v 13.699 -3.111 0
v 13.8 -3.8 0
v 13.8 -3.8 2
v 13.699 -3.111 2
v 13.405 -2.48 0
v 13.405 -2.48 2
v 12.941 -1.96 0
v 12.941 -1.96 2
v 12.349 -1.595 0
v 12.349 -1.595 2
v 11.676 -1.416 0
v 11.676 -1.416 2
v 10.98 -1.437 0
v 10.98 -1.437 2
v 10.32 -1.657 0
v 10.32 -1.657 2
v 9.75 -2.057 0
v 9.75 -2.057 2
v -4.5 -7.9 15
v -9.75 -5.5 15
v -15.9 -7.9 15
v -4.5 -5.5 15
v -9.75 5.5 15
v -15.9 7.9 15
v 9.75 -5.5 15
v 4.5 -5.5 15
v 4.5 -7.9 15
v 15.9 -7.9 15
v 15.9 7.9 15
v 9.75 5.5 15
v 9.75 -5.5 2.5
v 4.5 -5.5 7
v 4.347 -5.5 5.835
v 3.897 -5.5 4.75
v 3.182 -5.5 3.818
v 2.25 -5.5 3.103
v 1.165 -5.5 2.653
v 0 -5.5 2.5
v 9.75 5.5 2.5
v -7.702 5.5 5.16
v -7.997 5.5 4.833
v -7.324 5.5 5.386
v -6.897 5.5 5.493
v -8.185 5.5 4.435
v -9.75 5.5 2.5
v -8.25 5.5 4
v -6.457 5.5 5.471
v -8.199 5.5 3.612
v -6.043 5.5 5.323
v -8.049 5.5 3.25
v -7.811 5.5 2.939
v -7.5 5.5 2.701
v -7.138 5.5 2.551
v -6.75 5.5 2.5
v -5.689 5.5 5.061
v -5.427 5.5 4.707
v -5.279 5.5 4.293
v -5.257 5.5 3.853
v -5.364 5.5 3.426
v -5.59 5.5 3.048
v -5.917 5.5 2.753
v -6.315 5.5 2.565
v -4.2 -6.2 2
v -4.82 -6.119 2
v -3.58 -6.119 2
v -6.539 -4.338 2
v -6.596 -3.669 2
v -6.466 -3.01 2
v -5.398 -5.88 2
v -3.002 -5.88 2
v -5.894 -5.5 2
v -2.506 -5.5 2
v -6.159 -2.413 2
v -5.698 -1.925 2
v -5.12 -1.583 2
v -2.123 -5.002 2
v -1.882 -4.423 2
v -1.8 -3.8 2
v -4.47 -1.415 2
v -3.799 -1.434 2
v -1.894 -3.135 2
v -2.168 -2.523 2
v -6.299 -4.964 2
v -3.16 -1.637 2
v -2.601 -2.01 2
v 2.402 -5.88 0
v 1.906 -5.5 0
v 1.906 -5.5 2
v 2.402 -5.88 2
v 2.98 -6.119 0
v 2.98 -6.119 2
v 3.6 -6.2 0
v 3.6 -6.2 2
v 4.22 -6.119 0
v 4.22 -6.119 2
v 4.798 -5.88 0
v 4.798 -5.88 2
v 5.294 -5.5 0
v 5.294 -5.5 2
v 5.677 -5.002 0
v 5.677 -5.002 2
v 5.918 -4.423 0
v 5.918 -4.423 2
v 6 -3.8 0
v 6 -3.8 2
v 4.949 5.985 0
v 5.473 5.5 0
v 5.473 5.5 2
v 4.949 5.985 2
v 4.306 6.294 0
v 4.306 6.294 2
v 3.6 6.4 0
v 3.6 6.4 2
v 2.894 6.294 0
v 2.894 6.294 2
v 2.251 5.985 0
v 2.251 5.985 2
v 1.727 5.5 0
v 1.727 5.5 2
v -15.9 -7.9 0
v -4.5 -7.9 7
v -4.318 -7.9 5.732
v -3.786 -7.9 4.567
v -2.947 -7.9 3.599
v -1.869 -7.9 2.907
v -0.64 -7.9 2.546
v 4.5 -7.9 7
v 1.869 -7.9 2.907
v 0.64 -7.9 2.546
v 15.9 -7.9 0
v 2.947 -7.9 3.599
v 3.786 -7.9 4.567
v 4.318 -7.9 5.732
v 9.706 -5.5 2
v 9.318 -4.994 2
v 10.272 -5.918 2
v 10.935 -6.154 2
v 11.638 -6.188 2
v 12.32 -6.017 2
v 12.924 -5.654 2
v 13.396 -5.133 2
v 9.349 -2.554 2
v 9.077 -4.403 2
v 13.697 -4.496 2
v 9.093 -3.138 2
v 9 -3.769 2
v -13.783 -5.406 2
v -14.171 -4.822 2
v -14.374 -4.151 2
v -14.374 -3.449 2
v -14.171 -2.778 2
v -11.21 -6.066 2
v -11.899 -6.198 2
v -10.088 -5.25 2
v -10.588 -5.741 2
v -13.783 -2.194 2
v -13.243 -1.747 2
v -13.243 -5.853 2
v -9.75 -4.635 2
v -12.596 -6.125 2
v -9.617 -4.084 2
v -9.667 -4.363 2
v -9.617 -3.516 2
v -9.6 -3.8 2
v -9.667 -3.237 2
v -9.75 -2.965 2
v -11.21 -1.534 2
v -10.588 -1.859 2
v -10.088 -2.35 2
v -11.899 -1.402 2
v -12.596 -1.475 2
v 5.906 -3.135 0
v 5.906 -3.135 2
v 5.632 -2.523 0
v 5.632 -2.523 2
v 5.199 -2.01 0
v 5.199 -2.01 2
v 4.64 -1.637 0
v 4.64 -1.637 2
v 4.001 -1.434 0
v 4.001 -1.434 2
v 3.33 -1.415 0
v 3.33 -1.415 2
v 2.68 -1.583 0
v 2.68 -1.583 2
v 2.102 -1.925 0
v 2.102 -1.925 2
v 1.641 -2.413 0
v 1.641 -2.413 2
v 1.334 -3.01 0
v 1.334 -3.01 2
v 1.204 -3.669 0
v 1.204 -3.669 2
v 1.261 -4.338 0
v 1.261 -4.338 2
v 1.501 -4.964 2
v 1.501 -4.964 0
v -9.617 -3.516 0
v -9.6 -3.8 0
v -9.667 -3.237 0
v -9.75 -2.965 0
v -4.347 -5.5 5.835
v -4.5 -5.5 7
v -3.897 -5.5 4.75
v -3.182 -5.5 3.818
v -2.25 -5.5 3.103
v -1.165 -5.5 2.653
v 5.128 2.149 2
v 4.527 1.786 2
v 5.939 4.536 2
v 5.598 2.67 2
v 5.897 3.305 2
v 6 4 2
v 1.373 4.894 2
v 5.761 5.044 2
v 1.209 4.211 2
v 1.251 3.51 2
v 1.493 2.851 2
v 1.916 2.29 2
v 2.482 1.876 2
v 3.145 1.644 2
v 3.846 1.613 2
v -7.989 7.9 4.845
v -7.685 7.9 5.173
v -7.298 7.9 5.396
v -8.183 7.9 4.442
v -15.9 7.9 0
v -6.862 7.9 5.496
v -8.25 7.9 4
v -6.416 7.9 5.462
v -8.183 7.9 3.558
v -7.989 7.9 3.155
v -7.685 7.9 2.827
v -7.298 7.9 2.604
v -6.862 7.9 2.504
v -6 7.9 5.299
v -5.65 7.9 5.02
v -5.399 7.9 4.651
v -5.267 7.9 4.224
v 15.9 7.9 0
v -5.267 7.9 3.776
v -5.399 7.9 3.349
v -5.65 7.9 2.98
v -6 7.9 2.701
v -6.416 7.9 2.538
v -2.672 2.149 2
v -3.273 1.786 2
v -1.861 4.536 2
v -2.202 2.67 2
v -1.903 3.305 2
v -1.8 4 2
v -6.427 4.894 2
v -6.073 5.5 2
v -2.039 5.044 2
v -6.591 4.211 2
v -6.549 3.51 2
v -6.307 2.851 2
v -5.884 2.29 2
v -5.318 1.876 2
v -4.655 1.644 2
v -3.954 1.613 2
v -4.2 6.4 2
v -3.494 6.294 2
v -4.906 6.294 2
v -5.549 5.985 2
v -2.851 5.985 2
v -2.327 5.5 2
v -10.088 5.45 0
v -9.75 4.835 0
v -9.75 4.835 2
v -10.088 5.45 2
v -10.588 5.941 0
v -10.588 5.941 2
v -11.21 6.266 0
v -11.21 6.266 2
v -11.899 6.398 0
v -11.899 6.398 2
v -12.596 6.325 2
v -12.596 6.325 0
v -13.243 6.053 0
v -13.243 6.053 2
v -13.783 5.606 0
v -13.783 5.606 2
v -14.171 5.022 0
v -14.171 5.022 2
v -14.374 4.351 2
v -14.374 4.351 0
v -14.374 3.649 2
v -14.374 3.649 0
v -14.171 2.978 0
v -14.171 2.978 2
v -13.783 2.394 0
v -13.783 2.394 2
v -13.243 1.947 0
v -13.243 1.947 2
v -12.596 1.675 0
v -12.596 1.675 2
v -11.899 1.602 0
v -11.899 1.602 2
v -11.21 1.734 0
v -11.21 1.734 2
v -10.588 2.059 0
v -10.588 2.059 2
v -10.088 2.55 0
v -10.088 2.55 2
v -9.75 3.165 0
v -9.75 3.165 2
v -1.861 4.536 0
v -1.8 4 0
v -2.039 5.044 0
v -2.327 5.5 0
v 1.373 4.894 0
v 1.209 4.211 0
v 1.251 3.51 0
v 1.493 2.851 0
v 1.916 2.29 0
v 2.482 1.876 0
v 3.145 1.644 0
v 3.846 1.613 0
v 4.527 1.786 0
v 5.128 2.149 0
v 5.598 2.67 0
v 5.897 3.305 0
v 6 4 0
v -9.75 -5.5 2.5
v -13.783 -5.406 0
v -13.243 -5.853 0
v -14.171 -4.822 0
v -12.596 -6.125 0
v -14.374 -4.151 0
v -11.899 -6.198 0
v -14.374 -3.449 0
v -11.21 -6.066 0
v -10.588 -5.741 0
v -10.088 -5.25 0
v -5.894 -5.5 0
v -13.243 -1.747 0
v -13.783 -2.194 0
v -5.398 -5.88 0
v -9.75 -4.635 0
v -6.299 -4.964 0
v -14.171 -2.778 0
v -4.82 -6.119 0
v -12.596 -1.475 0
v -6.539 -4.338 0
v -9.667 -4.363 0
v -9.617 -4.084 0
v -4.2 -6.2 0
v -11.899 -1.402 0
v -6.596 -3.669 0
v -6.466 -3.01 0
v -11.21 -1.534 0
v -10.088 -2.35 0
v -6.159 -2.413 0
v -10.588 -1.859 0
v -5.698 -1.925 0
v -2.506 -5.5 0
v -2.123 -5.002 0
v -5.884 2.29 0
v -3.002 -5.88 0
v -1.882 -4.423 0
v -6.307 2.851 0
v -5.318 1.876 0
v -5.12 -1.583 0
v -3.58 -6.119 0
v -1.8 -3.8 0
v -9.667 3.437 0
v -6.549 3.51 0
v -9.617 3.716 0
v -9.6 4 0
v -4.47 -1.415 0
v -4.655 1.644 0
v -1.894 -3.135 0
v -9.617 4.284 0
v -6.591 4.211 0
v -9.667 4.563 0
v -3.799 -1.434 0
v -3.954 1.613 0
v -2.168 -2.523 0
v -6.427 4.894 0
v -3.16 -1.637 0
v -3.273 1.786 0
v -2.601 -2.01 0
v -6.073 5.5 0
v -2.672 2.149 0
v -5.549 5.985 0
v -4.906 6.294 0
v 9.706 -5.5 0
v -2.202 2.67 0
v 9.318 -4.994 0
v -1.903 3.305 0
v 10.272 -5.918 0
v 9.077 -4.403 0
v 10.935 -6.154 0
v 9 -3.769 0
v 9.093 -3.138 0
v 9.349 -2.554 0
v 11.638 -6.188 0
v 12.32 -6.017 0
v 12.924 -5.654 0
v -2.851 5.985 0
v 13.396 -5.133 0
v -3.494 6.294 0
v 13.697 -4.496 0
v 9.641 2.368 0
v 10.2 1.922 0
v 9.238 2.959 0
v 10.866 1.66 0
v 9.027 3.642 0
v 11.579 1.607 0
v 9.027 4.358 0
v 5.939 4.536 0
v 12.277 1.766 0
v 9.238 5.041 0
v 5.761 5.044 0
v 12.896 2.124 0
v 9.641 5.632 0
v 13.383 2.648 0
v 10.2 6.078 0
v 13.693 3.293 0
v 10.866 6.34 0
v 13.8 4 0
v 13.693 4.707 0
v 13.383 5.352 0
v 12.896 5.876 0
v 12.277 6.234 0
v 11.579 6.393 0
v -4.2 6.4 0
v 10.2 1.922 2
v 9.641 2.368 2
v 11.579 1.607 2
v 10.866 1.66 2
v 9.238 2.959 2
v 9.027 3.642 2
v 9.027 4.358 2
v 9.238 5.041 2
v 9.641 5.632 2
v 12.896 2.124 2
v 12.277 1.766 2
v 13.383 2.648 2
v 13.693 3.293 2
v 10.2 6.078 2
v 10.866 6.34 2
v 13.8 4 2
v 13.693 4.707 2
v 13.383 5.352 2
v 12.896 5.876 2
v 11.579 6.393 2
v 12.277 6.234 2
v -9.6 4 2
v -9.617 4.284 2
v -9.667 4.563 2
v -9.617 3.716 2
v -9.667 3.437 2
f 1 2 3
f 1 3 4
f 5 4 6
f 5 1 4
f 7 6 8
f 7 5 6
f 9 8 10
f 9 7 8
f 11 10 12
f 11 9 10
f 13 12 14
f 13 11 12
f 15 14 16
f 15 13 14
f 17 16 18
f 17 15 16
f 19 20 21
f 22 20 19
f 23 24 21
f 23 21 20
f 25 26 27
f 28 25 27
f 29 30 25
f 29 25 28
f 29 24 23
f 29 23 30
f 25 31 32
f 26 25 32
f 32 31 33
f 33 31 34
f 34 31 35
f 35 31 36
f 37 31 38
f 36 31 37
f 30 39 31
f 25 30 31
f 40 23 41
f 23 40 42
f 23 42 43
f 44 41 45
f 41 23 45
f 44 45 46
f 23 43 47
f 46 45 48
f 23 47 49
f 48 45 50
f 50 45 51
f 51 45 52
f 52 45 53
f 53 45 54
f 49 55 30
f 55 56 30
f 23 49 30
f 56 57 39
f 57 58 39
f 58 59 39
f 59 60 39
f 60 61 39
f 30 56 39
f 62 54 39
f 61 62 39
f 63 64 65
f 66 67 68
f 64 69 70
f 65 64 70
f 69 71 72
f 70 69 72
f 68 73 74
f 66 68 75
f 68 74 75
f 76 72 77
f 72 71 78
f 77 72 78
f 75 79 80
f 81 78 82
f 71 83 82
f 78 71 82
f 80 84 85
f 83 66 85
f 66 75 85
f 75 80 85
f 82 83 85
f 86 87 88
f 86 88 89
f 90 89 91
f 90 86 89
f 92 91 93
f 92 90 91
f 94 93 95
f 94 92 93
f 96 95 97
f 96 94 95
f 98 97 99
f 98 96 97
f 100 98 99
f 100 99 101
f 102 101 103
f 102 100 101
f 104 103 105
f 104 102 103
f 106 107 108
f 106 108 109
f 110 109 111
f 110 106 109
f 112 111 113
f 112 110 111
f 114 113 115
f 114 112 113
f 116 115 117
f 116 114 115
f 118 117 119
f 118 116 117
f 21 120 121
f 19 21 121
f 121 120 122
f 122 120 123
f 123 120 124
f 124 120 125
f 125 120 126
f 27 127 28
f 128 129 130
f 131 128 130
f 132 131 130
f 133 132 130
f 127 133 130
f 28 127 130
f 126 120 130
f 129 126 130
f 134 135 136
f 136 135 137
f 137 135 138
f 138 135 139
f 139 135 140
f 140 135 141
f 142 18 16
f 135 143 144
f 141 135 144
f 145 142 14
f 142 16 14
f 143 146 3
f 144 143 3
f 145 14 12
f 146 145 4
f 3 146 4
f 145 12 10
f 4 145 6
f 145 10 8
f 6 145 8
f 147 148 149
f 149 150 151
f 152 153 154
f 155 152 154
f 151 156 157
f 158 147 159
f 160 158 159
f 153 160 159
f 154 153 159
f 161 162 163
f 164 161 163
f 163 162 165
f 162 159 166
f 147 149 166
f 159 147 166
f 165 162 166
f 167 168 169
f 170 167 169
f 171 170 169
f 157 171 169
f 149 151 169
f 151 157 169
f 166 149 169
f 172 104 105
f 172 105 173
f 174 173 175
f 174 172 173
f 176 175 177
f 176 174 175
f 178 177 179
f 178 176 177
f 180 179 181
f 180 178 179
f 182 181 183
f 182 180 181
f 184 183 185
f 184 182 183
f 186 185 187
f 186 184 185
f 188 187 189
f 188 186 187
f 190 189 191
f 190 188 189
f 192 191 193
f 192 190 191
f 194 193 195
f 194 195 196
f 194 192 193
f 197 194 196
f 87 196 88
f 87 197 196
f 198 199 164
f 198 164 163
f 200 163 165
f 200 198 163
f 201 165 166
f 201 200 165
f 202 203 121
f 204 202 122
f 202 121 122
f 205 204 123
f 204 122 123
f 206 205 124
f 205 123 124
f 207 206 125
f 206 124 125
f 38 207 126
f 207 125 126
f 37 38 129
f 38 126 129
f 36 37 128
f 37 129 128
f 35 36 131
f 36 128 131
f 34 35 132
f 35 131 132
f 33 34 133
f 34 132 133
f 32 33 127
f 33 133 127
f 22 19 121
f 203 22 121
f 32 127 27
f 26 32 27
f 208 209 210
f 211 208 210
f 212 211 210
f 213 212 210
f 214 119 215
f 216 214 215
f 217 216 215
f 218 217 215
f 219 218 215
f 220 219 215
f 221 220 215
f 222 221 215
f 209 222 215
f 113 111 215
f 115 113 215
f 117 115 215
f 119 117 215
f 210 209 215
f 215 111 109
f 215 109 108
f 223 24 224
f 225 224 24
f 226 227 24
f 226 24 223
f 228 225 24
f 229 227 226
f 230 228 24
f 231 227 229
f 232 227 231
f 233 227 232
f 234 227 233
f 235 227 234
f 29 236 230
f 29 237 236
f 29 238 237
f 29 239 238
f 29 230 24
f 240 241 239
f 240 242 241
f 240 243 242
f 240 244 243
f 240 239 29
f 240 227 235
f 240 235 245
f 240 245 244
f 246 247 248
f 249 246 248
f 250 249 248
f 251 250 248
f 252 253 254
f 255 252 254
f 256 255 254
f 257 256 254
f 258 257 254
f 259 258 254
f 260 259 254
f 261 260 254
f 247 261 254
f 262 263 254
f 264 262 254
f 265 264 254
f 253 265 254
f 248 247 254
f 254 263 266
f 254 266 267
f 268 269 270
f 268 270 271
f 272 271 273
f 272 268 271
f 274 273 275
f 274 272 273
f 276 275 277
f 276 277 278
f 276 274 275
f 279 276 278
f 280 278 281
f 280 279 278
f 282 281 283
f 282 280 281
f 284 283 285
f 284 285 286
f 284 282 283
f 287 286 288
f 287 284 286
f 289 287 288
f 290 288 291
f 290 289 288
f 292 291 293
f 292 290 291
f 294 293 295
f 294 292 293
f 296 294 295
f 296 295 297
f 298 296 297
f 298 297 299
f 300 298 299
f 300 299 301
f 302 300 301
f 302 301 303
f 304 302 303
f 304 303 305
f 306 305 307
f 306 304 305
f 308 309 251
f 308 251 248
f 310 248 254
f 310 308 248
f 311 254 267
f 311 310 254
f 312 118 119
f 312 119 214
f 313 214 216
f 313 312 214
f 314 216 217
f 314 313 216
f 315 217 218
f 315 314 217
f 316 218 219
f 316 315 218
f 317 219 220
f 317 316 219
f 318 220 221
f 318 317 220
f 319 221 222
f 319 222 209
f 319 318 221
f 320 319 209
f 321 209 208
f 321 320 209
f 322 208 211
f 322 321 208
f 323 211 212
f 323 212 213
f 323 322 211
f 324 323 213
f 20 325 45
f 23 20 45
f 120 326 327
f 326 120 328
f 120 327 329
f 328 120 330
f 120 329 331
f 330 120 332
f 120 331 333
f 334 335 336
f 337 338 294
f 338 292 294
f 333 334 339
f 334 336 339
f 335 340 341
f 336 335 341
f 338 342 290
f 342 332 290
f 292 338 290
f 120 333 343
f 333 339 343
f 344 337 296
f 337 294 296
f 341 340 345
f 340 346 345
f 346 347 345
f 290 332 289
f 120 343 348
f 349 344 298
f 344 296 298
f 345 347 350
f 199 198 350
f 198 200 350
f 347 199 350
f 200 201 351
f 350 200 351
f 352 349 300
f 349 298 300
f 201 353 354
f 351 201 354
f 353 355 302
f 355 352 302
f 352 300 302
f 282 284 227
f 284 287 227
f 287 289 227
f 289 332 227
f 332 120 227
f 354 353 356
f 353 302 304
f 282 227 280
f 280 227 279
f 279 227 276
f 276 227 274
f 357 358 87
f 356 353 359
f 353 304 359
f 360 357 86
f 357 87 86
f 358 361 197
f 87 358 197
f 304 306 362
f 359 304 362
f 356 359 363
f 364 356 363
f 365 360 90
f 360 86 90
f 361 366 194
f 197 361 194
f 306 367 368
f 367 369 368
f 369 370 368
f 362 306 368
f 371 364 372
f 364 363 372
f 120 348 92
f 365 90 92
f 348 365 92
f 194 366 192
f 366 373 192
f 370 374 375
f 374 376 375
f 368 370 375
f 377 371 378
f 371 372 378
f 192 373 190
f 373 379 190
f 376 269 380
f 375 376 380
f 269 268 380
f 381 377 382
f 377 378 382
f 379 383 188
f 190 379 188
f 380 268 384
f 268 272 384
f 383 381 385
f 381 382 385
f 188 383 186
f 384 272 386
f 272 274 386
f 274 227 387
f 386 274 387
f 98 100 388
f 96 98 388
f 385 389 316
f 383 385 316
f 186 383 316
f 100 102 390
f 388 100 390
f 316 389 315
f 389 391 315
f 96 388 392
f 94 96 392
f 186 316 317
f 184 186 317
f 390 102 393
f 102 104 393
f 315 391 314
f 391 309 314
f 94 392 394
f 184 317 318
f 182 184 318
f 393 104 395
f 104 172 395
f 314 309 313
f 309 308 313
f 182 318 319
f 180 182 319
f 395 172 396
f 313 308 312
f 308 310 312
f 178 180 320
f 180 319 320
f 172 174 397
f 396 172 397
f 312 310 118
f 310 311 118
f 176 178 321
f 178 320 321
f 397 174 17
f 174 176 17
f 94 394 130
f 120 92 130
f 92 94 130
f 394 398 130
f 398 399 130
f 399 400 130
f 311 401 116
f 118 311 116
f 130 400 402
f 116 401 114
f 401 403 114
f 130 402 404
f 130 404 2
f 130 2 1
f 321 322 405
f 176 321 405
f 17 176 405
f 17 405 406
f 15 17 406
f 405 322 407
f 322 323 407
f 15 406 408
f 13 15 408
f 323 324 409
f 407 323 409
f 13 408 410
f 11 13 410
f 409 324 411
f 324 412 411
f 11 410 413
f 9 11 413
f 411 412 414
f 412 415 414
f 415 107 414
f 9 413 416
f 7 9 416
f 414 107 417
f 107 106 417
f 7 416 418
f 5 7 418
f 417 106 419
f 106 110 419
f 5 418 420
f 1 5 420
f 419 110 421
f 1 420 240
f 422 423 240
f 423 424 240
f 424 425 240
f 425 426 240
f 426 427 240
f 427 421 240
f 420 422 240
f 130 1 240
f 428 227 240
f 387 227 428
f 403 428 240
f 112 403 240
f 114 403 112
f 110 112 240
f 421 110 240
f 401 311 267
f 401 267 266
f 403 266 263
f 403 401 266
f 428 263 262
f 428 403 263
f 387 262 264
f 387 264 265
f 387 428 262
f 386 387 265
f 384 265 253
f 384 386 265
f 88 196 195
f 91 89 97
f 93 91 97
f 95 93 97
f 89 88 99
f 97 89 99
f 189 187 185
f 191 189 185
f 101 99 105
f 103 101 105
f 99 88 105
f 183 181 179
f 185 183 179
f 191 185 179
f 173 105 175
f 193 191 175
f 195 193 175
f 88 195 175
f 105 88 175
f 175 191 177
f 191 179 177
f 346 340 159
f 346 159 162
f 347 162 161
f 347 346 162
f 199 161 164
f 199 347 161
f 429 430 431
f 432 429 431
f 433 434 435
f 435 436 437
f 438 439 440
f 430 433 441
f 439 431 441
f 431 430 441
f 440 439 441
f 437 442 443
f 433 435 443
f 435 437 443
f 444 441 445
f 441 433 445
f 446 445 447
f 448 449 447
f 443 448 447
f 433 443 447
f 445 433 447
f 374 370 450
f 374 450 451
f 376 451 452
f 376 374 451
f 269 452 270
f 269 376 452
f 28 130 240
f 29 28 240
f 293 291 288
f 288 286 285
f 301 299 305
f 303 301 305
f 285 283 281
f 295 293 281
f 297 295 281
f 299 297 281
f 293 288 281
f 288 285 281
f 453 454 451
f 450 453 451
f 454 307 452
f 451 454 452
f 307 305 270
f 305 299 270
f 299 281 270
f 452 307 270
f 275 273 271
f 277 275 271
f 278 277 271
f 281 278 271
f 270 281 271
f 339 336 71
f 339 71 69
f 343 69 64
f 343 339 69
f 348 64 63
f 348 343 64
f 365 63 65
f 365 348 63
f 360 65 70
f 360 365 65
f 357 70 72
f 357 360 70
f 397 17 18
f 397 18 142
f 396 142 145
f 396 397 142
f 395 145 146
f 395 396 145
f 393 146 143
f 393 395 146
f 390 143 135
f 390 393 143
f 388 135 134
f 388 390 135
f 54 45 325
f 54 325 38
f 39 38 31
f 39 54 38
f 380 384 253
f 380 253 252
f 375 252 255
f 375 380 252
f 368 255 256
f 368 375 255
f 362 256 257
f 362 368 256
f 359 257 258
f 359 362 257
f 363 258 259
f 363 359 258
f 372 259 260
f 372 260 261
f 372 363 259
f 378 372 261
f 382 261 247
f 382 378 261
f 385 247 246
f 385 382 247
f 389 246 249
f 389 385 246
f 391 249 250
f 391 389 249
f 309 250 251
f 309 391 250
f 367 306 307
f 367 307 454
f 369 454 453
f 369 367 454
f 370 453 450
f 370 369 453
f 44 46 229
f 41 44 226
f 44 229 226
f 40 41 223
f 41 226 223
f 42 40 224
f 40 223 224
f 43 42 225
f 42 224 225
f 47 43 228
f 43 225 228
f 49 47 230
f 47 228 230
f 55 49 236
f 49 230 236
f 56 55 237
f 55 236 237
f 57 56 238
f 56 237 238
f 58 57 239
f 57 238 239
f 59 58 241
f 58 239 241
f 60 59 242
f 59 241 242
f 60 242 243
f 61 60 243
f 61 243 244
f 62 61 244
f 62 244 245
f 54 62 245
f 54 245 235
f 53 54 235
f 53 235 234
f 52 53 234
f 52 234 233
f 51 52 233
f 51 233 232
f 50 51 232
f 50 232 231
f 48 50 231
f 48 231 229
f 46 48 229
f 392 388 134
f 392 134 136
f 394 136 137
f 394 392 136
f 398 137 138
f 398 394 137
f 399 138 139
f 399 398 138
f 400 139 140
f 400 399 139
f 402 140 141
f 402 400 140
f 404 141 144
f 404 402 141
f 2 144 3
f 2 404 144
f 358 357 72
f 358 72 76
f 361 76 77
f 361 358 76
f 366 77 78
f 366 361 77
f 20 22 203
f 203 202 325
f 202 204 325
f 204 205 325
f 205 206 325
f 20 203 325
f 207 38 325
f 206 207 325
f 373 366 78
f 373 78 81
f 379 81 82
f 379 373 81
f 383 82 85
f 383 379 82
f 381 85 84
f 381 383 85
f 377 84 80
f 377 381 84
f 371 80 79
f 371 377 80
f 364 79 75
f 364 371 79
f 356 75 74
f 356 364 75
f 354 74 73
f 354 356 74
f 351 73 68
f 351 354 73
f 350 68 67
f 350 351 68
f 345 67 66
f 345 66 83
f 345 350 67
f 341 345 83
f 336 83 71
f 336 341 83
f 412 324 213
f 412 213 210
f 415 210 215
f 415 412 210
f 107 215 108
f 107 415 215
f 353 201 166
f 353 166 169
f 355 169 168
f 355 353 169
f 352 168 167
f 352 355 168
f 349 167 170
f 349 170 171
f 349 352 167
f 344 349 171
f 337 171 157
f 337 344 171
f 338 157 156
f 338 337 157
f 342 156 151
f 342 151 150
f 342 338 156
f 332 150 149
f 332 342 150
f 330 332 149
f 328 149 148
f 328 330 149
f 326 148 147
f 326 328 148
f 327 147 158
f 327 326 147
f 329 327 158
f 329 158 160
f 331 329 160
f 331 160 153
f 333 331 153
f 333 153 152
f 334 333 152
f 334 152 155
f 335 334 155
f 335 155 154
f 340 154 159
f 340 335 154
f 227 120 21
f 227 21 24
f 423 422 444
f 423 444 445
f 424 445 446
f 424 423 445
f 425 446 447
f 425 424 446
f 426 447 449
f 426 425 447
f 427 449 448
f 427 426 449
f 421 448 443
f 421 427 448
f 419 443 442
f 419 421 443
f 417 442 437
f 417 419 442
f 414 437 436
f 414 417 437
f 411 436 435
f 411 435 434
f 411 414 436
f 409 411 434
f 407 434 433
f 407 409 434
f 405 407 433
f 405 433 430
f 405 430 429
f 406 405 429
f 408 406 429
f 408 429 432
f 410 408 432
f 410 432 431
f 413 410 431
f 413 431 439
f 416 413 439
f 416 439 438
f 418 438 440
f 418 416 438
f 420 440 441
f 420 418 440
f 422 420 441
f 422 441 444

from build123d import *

# Parameters (mm, degrees)
F0_W     = 31.8
F0_H     = 15.8
F1_DEPTH = 15
F3_DEPTH = 2.4
F4_DEPTH = 2.5
F5_R     = 1.5
F6_DEPTH = 2.4
F7_DEPTH = 2


with BuildPart() as f1:
    # F0 (on Top) → F1 (new body)
    with BuildSketch(Plane.XY):
        Rectangle(F0_W, F0_H)
        with BuildLine():
            Line((-9.75, 4.8351646544), (-9.75, 5.5))
            Line((-9.75, 5.5), (-6.0734993995, 5.5))
            ThreePointArc((-6.0734993995, 5.5), (-4.2, 6.4), (-2.3265006005, 5.5))
            Line((-2.3265006005, 5.5), (1.7265006005, 5.5))
            ThreePointArc((1.7265006005, 5.5), (3.6, 6.4), (5.4734993995, 5.5))
            Line((5.4734993995, 5.5), (9.5265006005, 5.5))
            ThreePointArc((9.5265006005, 5.5), (12.1948589312, 6.2645527769), (13.8, 4))
            ThreePointArc((13.8, 4), (12.3486832981, 1.7954592315), (9.75, 2.2571574942))
            Line((9.75, 2.2571574942), (9.75, -2.0571574942))
            ThreePointArc((9.75, -2.0571574942), (12.3486832981, -1.5954592315), (13.8, -3.8))
            ThreePointArc((13.8, -3.8), (12.3203646443, -6.016512784), (9.7058925654, -5.5))
            Line((9.7058925654, -5.5), (5.2941074346, -5.5))
            ThreePointArc((5.2941074346, -5.5), (3.6, -6.2), (1.9058925654, -5.5))
            Line((1.9058925654, -5.5), (-2.5058925654, -5.5))
            ThreePointArc((-2.5058925654, -5.5), (-4.2, -6.2), (-5.8941074346, -5.5))
            Line((-5.8941074346, -5.5), (-9.75, -5.5))
            Line((-9.75, -5.5), (-9.75, -4.6351646544))
            ThreePointArc((-9.75, -4.6351646544), (-14.4, -3.8), (-9.75, -2.9648353456))
            Line((-9.75, -2.9648353456), (-9.75, 3.1648353456))
            ThreePointArc((-9.75, 3.1648353456), (-14.4, 4), (-9.75, 4.8351646544))
        make_face(mode=Mode.SUBTRACT)
        with BuildLine():
            Line((-9.75, -4.6351646544), (-9.75, -2.9648353456))
            ThreePointArc((-9.75, -2.9648353456), (-14.4, -3.8), (-9.75, -4.6351646544))
        make_face()
        with BuildLine():
            Line((-9.75, 3.1648353456), (-9.75, 4.8351646544))
            ThreePointArc((-9.75, 4.8351646544), (-14.4, 4), (-9.75, 3.1648353456))
        make_face()
        with BuildLine():
            ThreePointArc((13.8, 4), (12.1948589312, 6.2645527769), (9.5265006005, 5.5))
            Line((9.5265006005, 5.5), (9.75, 5.5))
            Line((9.75, 5.5), (9.75, 2.2571574942))
            ThreePointArc((9.75, 2.2571574942), (12.3486832981, 1.7954592315), (13.8, 4))
        make_face()
        with BuildLine():
            ThreePointArc((13.8, -3.8), (12.3486832981, -1.5954592315), (9.75, -2.0571574942))
            Line((9.75, -2.0571574942), (9.75, -5.5))
            Line((9.75, -5.5), (9.7058925654, -5.5))
            ThreePointArc((9.7058925654, -5.5), (12.3203646443, -6.016512784), (13.8, -3.8))
        make_face()
        with BuildLine():
            ThreePointArc((-2.3265006005, 5.5), (-4.2, 6.4), (-6.0734993995, 5.5))
            Line((-6.0734993995, 5.5), (-2.3265006005, 5.5))
        make_face()
        with BuildLine():
            ThreePointArc((5.4734993995, 5.5), (3.6, 6.4), (1.7265006005, 5.5))
            Line((1.7265006005, 5.5), (5.4734993995, 5.5))
        make_face()
        with BuildLine():
            Line((5.2941074346, -5.5), (1.9058925654, -5.5))
            ThreePointArc((1.9058925654, -5.5), (3.6, -6.2), (5.2941074346, -5.5))
        make_face()
        with BuildLine():
            Line((-2.5058925654, -5.5), (-5.8941074346, -5.5))
            ThreePointArc((-5.8941074346, -5.5), (-4.2, -6.2), (-2.5058925654, -5.5))
        make_face()
    extrude(amount=F1_DEPTH)

    # F2 (on face) → F3 (cut, through all)
    with BuildSketch(Plane.XZ.offset(7.9)):
        with BuildLine():
            Line((4.5, 15), (-4.5, 15))
            Line((-4.5, 15), (-4.5, 7))
            ThreePointArc((-4.5, 7), (0, 2.5), (4.5, 7))
            Line((4.5, 7), (4.5, 15))
        make_face()
    extrude(amount=-F3_DEPTH, mode=Mode.SUBTRACT)

    # F0 (on Top) → F4 (join)
    with BuildSketch(Plane.XY):
        with BuildLine():
            Line((-6.0734993995, 5.5), (-9.75, 5.5))
            Line((-9.75, 5.5), (-9.75, 4.8351646544))
            ThreePointArc((-9.75, 4.8351646544), (-9.6377976378, 4.4242640687), (-9.6, 4))
            ThreePointArc((-9.6, 4), (-9.6377976378, 3.5757359313), (-9.75, 3.1648353456))
            Line((-9.75, 3.1648353456), (-9.75, -2.9648353456))
            ThreePointArc((-9.75, -2.9648353456), (-9.6377976378, -3.3757359313), (-9.6, -3.8))
            ThreePointArc((-9.6, -3.8), (-9.6377976378, -4.2242640687), (-9.75, -4.6351646544))
            Line((-9.75, -4.6351646544), (-9.75, -5.5))
            Line((-9.75, -5.5), (-5.8941074346, -5.5))
            ThreePointArc((-5.8941074346, -5.5), (-5.1203646443, -1.583487216), (-1.8, -3.8))
            ThreePointArc((-1.8, -3.8), (-1.983487216, -4.7203646443), (-2.5058925654, -5.5))
            Line((-2.5058925654, -5.5), (1.9058925654, -5.5))
            ThreePointArc((1.9058925654, -5.5), (2.6796353557, -1.583487216), (6, -3.8))
            ThreePointArc((6, -3.8), (5.816512784, -4.7203646443), (5.2941074346, -5.5))
            Line((5.2941074346, -5.5), (9.7058925654, -5.5))
            ThreePointArc((9.7058925654, -5.5), (9.0001969324, -3.7692553009), (9.75, -2.0571574942))
            Line((9.75, -2.0571574942), (9.75, 2.2571574942))
            ThreePointArc((9.75, 2.2571574942), (9.0056798702, 3.8349814676), (9.5265006005, 5.5))
            Line((9.5265006005, 5.5), (5.4734993995, 5.5))
            ThreePointArc((5.4734993995, 5.5), (5.8645527769, 4.7948589312), (6, 4))
            ThreePointArc((6, 4), (2.8051410688, 1.7354472231), (1.7265006005, 5.5))
            Line((1.7265006005, 5.5), (-2.3265006005, 5.5))
            ThreePointArc((-2.3265006005, 5.5), (-1.9354472231, 4.7948589312), (-1.8, 4))
            ThreePointArc((-1.8, 4), (-4.9948589312, 1.7354472231), (-6.0734993995, 5.5))
        make_face()
        with BuildLine():
            ThreePointArc((6, -3.8), (2.6796353557, -1.583487216), (1.9058925654, -5.5))
            Line((1.9058925654, -5.5), (5.2941074346, -5.5))
            ThreePointArc((5.2941074346, -5.5), (5.816512784, -4.7203646443), (6, -3.8))
        make_face()
        with BuildLine():
            ThreePointArc((-1.8, -3.8), (-5.1203646443, -1.583487216), (-5.8941074346, -5.5))
            Line((-5.8941074346, -5.5), (-2.5058925654, -5.5))
            ThreePointArc((-2.5058925654, -5.5), (-1.983487216, -4.7203646443), (-1.8, -3.8))
        make_face()
        with BuildLine():
            Line((-2.3265006005, 5.5), (-6.0734993995, 5.5))
            ThreePointArc((-6.0734993995, 5.5), (-4.9948589312, 1.7354472231), (-1.8, 4))
            ThreePointArc((-1.8, 4), (-1.9354472231, 4.7948589312), (-2.3265006005, 5.5))
        make_face()
        with BuildLine():
            Line((5.4734993995, 5.5), (1.7265006005, 5.5))
            ThreePointArc((1.7265006005, 5.5), (2.8051410688, 1.7354472231), (6, 4))
            ThreePointArc((6, 4), (5.8645527769, 4.7948589312), (5.4734993995, 5.5))
        make_face()
        with BuildLine():
            Line((9.75, -5.5), (9.75, -2.0571574942))
            ThreePointArc((9.75, -2.0571574942), (9.0001969324, -3.7692553009), (9.7058925654, -5.5))
            Line((9.7058925654, -5.5), (9.75, -5.5))
        make_face()
        with BuildLine():
            Line((9.75, 5.5), (9.5265006005, 5.5))
            ThreePointArc((9.5265006005, 5.5), (9.0056798702, 3.8349814676), (9.75, 2.2571574942))
            Line((9.75, 2.2571574942), (9.75, 5.5))
        make_face()
        with BuildLine():
            ThreePointArc((-9.6, 4), (-9.6377976378, 4.4242640687), (-9.75, 4.8351646544))
            Line((-9.75, 4.8351646544), (-9.75, 3.1648353456))
            ThreePointArc((-9.75, 3.1648353456), (-9.6377976378, 3.5757359313), (-9.6, 4))
        make_face()
        with BuildLine():
            ThreePointArc((-9.6, -3.8), (-9.6377976378, -3.3757359313), (-9.75, -2.9648353456))
            Line((-9.75, -2.9648353456), (-9.75, -4.6351646544))
            ThreePointArc((-9.75, -4.6351646544), (-9.6377976378, -4.2242640687), (-9.6, -3.8))
        make_face()
    extrude(amount=F4_DEPTH)

    # F5 (on face) → F6 (cut, through all)
    with BuildSketch(Plane(origin=(0, 7.9, 0), x_dir=(-1, 0, 0), z_dir=(0, 1, 0))):
        with Locations((6.75, 4)):
            Circle(F5_R)
    extrude(amount=-F6_DEPTH, mode=Mode.SUBTRACT)

    # F0 (on Top) → F7 (cut)
    with BuildSketch(Plane.XY):
        with BuildLine():
            ThreePointArc((13.8, 4), (12.1948589312, 6.2645527769), (9.5265006005, 5.5))
            Line((9.5265006005, 5.5), (9.75, 5.5))
            Line((9.75, 5.5), (9.75, 2.2571574942))
            ThreePointArc((9.75, 2.2571574942), (12.3486832981, 1.7954592315), (13.8, 4))
        make_face()
        with BuildLine():
            Line((9.75, 5.5), (9.5265006005, 5.5))
            ThreePointArc((9.5265006005, 5.5), (9.0056798702, 3.8349814676), (9.75, 2.2571574942))
            Line((9.75, 2.2571574942), (9.75, 5.5))
        make_face()
        with BuildLine():
            Line((5.4734993995, 5.5), (1.7265006005, 5.5))
            ThreePointArc((1.7265006005, 5.5), (2.8051410688, 1.7354472231), (6, 4))
            ThreePointArc((6, 4), (5.8645527769, 4.7948589312), (5.4734993995, 5.5))
        make_face()
        with BuildLine():
            ThreePointArc((5.4734993995, 5.5), (3.6, 6.4), (1.7265006005, 5.5))
            Line((1.7265006005, 5.5), (5.4734993995, 5.5))
        make_face()
        with BuildLine():
            Line((-2.3265006005, 5.5), (-6.0734993995, 5.5))
            ThreePointArc((-6.0734993995, 5.5), (-4.9948589312, 1.7354472231), (-1.8, 4))
            ThreePointArc((-1.8, 4), (-1.9354472231, 4.7948589312), (-2.3265006005, 5.5))
        make_face()
        with BuildLine():
            ThreePointArc((-2.3265006005, 5.5), (-4.2, 6.4), (-6.0734993995, 5.5))
            Line((-6.0734993995, 5.5), (-2.3265006005, 5.5))
        make_face()
        with BuildLine():
            Line((-9.75, 3.1648353456), (-9.75, 4.8351646544))
            ThreePointArc((-9.75, 4.8351646544), (-14.4, 4), (-9.75, 3.1648353456))
        make_face()
        with BuildLine():
            ThreePointArc((-9.6, 4), (-9.6377976378, 4.4242640687), (-9.75, 4.8351646544))
            Line((-9.75, 4.8351646544), (-9.75, 3.1648353456))
            ThreePointArc((-9.75, 3.1648353456), (-9.6377976378, 3.5757359313), (-9.6, 4))
        make_face()
        with BuildLine():
            Line((-9.75, -4.6351646544), (-9.75, -2.9648353456))
            ThreePointArc((-9.75, -2.9648353456), (-14.4, -3.8), (-9.75, -4.6351646544))
        make_face()
        with BuildLine():
            ThreePointArc((-9.6, -3.8), (-9.6377976378, -3.3757359313), (-9.75, -2.9648353456))
            Line((-9.75, -2.9648353456), (-9.75, -4.6351646544))
            ThreePointArc((-9.75, -4.6351646544), (-9.6377976378, -4.2242640687), (-9.6, -3.8))
        make_face()
        with BuildLine():
            ThreePointArc((-1.8, -3.8), (-5.1203646443, -1.583487216), (-5.8941074346, -5.5))
            Line((-5.8941074346, -5.5), (-2.5058925654, -5.5))
            ThreePointArc((-2.5058925654, -5.5), (-1.983487216, -4.7203646443), (-1.8, -3.8))
        make_face()
        with BuildLine():
            Line((-2.5058925654, -5.5), (-5.8941074346, -5.5))
            ThreePointArc((-5.8941074346, -5.5), (-4.2, -6.2), (-2.5058925654, -5.5))
        make_face()
        with BuildLine():
            ThreePointArc((6, -3.8), (2.6796353557, -1.583487216), (1.9058925654, -5.5))
            Line((1.9058925654, -5.5), (5.2941074346, -5.5))
            ThreePointArc((5.2941074346, -5.5), (5.816512784, -4.7203646443), (6, -3.8))
        make_face()
        with BuildLine():
            Line((5.2941074346, -5.5), (1.9058925654, -5.5))
            ThreePointArc((1.9058925654, -5.5), (3.6, -6.2), (5.2941074346, -5.5))
        make_face()
        with BuildLine():
            ThreePointArc((13.8, -3.8), (12.3486832981, -1.5954592315), (9.75, -2.0571574942))
            Line((9.75, -2.0571574942), (9.75, -5.5))
            Line((9.75, -5.5), (9.7058925654, -5.5))
            ThreePointArc((9.7058925654, -5.5), (12.3203646443, -6.016512784), (13.8, -3.8))
        make_face()
        with BuildLine():
            Line((9.75, -5.5), (9.75, -2.0571574942))
            ThreePointArc((9.75, -2.0571574942), (9.0001969324, -3.7692553009), (9.7058925654, -5.5))
            Line((9.7058925654, -5.5), (9.75, -5.5))
        make_face()
    extrude(amount=F7_DEPTH, mode=Mode.SUBTRACT)


solid = f1.part
